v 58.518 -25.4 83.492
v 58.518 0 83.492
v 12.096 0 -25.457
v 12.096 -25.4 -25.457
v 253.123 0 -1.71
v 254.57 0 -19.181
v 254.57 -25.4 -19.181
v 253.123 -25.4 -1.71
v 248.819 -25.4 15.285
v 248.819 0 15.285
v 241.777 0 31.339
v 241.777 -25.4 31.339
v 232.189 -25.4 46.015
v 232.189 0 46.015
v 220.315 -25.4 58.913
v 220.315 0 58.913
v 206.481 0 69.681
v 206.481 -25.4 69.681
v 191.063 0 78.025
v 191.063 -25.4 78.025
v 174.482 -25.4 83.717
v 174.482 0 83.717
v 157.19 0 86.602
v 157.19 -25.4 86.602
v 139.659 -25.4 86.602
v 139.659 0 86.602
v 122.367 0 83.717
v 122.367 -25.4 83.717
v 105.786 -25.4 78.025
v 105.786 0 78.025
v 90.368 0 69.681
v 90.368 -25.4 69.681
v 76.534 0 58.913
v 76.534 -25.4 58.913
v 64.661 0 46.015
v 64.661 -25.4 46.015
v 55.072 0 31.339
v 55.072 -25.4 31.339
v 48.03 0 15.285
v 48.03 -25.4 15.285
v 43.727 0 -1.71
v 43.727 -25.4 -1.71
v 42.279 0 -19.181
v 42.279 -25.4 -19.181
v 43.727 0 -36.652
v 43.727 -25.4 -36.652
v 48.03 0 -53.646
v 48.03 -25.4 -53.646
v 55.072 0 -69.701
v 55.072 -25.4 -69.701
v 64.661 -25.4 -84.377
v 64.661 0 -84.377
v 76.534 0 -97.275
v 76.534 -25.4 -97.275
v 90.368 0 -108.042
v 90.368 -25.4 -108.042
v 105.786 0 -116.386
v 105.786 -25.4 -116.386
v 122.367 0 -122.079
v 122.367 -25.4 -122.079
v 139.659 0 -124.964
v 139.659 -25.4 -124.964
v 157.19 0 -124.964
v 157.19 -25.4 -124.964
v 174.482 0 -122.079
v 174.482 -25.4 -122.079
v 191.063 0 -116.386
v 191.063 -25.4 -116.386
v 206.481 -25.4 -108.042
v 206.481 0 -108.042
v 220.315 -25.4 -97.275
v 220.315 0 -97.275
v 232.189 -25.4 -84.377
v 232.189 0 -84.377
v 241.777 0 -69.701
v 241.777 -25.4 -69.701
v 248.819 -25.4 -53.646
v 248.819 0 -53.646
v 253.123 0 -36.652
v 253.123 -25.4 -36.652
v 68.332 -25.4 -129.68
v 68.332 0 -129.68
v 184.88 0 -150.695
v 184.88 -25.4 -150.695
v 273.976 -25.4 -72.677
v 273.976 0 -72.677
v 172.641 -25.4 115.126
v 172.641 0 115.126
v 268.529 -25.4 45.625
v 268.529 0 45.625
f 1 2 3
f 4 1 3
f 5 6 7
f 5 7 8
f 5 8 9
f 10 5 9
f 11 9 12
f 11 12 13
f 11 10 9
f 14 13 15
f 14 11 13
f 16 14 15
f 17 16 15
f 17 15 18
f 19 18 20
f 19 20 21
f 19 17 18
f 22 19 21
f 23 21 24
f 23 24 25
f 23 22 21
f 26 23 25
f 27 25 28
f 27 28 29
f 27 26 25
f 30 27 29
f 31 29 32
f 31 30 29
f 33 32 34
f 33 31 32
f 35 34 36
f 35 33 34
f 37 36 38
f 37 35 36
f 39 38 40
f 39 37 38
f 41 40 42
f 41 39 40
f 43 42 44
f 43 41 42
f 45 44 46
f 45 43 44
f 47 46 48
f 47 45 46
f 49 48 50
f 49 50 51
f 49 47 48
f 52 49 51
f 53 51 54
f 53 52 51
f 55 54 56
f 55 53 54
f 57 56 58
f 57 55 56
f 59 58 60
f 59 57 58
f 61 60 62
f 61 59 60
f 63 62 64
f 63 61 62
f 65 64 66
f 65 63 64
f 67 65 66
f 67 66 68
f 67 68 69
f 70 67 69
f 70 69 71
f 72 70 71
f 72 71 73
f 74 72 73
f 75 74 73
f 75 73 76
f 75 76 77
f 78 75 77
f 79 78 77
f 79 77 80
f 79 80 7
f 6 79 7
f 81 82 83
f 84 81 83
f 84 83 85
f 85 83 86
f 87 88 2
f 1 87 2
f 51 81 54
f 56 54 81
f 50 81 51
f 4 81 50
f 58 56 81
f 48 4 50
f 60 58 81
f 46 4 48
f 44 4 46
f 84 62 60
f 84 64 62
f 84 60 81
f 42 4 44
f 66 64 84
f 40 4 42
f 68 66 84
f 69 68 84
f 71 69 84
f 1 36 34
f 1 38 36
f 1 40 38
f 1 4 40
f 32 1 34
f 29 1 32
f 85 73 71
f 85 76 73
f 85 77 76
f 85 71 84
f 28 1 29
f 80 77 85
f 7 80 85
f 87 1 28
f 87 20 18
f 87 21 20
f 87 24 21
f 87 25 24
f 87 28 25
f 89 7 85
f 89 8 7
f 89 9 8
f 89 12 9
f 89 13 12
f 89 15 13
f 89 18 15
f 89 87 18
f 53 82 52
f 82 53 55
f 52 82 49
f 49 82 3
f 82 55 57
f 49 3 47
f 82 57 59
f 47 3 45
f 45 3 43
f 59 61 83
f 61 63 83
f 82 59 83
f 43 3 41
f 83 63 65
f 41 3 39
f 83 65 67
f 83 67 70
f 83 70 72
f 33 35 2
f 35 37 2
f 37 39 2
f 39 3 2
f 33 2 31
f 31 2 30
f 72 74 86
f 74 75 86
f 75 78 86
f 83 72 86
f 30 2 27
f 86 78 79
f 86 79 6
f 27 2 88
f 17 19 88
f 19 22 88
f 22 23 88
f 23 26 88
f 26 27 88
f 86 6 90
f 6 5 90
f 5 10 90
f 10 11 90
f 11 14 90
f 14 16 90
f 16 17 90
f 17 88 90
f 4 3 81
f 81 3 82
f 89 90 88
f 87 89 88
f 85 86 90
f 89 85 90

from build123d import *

# Parameters (mm, degrees)
F1_R     = 106.145751
F2_DEPTH = 25.4


with BuildPart() as f2:
    # F1 (on face) → F2 (new body)
    with BuildSketch(Plane.XZ):
        Polygon((172.641336, 115.126468), (58.517822, 83.491787), (12.095964, -25.457471), (68.332369, -129.680292), (184.879876, -150.694766), (273.975836, -72.676566), (268.529173, 45.625013), align=None)
        with Locations((148.424625, -19.180832)):
            Circle(F1_R, mode=Mode.SUBTRACT)
    extrude(amount=F2_DEPTH)


solid = f2.part
